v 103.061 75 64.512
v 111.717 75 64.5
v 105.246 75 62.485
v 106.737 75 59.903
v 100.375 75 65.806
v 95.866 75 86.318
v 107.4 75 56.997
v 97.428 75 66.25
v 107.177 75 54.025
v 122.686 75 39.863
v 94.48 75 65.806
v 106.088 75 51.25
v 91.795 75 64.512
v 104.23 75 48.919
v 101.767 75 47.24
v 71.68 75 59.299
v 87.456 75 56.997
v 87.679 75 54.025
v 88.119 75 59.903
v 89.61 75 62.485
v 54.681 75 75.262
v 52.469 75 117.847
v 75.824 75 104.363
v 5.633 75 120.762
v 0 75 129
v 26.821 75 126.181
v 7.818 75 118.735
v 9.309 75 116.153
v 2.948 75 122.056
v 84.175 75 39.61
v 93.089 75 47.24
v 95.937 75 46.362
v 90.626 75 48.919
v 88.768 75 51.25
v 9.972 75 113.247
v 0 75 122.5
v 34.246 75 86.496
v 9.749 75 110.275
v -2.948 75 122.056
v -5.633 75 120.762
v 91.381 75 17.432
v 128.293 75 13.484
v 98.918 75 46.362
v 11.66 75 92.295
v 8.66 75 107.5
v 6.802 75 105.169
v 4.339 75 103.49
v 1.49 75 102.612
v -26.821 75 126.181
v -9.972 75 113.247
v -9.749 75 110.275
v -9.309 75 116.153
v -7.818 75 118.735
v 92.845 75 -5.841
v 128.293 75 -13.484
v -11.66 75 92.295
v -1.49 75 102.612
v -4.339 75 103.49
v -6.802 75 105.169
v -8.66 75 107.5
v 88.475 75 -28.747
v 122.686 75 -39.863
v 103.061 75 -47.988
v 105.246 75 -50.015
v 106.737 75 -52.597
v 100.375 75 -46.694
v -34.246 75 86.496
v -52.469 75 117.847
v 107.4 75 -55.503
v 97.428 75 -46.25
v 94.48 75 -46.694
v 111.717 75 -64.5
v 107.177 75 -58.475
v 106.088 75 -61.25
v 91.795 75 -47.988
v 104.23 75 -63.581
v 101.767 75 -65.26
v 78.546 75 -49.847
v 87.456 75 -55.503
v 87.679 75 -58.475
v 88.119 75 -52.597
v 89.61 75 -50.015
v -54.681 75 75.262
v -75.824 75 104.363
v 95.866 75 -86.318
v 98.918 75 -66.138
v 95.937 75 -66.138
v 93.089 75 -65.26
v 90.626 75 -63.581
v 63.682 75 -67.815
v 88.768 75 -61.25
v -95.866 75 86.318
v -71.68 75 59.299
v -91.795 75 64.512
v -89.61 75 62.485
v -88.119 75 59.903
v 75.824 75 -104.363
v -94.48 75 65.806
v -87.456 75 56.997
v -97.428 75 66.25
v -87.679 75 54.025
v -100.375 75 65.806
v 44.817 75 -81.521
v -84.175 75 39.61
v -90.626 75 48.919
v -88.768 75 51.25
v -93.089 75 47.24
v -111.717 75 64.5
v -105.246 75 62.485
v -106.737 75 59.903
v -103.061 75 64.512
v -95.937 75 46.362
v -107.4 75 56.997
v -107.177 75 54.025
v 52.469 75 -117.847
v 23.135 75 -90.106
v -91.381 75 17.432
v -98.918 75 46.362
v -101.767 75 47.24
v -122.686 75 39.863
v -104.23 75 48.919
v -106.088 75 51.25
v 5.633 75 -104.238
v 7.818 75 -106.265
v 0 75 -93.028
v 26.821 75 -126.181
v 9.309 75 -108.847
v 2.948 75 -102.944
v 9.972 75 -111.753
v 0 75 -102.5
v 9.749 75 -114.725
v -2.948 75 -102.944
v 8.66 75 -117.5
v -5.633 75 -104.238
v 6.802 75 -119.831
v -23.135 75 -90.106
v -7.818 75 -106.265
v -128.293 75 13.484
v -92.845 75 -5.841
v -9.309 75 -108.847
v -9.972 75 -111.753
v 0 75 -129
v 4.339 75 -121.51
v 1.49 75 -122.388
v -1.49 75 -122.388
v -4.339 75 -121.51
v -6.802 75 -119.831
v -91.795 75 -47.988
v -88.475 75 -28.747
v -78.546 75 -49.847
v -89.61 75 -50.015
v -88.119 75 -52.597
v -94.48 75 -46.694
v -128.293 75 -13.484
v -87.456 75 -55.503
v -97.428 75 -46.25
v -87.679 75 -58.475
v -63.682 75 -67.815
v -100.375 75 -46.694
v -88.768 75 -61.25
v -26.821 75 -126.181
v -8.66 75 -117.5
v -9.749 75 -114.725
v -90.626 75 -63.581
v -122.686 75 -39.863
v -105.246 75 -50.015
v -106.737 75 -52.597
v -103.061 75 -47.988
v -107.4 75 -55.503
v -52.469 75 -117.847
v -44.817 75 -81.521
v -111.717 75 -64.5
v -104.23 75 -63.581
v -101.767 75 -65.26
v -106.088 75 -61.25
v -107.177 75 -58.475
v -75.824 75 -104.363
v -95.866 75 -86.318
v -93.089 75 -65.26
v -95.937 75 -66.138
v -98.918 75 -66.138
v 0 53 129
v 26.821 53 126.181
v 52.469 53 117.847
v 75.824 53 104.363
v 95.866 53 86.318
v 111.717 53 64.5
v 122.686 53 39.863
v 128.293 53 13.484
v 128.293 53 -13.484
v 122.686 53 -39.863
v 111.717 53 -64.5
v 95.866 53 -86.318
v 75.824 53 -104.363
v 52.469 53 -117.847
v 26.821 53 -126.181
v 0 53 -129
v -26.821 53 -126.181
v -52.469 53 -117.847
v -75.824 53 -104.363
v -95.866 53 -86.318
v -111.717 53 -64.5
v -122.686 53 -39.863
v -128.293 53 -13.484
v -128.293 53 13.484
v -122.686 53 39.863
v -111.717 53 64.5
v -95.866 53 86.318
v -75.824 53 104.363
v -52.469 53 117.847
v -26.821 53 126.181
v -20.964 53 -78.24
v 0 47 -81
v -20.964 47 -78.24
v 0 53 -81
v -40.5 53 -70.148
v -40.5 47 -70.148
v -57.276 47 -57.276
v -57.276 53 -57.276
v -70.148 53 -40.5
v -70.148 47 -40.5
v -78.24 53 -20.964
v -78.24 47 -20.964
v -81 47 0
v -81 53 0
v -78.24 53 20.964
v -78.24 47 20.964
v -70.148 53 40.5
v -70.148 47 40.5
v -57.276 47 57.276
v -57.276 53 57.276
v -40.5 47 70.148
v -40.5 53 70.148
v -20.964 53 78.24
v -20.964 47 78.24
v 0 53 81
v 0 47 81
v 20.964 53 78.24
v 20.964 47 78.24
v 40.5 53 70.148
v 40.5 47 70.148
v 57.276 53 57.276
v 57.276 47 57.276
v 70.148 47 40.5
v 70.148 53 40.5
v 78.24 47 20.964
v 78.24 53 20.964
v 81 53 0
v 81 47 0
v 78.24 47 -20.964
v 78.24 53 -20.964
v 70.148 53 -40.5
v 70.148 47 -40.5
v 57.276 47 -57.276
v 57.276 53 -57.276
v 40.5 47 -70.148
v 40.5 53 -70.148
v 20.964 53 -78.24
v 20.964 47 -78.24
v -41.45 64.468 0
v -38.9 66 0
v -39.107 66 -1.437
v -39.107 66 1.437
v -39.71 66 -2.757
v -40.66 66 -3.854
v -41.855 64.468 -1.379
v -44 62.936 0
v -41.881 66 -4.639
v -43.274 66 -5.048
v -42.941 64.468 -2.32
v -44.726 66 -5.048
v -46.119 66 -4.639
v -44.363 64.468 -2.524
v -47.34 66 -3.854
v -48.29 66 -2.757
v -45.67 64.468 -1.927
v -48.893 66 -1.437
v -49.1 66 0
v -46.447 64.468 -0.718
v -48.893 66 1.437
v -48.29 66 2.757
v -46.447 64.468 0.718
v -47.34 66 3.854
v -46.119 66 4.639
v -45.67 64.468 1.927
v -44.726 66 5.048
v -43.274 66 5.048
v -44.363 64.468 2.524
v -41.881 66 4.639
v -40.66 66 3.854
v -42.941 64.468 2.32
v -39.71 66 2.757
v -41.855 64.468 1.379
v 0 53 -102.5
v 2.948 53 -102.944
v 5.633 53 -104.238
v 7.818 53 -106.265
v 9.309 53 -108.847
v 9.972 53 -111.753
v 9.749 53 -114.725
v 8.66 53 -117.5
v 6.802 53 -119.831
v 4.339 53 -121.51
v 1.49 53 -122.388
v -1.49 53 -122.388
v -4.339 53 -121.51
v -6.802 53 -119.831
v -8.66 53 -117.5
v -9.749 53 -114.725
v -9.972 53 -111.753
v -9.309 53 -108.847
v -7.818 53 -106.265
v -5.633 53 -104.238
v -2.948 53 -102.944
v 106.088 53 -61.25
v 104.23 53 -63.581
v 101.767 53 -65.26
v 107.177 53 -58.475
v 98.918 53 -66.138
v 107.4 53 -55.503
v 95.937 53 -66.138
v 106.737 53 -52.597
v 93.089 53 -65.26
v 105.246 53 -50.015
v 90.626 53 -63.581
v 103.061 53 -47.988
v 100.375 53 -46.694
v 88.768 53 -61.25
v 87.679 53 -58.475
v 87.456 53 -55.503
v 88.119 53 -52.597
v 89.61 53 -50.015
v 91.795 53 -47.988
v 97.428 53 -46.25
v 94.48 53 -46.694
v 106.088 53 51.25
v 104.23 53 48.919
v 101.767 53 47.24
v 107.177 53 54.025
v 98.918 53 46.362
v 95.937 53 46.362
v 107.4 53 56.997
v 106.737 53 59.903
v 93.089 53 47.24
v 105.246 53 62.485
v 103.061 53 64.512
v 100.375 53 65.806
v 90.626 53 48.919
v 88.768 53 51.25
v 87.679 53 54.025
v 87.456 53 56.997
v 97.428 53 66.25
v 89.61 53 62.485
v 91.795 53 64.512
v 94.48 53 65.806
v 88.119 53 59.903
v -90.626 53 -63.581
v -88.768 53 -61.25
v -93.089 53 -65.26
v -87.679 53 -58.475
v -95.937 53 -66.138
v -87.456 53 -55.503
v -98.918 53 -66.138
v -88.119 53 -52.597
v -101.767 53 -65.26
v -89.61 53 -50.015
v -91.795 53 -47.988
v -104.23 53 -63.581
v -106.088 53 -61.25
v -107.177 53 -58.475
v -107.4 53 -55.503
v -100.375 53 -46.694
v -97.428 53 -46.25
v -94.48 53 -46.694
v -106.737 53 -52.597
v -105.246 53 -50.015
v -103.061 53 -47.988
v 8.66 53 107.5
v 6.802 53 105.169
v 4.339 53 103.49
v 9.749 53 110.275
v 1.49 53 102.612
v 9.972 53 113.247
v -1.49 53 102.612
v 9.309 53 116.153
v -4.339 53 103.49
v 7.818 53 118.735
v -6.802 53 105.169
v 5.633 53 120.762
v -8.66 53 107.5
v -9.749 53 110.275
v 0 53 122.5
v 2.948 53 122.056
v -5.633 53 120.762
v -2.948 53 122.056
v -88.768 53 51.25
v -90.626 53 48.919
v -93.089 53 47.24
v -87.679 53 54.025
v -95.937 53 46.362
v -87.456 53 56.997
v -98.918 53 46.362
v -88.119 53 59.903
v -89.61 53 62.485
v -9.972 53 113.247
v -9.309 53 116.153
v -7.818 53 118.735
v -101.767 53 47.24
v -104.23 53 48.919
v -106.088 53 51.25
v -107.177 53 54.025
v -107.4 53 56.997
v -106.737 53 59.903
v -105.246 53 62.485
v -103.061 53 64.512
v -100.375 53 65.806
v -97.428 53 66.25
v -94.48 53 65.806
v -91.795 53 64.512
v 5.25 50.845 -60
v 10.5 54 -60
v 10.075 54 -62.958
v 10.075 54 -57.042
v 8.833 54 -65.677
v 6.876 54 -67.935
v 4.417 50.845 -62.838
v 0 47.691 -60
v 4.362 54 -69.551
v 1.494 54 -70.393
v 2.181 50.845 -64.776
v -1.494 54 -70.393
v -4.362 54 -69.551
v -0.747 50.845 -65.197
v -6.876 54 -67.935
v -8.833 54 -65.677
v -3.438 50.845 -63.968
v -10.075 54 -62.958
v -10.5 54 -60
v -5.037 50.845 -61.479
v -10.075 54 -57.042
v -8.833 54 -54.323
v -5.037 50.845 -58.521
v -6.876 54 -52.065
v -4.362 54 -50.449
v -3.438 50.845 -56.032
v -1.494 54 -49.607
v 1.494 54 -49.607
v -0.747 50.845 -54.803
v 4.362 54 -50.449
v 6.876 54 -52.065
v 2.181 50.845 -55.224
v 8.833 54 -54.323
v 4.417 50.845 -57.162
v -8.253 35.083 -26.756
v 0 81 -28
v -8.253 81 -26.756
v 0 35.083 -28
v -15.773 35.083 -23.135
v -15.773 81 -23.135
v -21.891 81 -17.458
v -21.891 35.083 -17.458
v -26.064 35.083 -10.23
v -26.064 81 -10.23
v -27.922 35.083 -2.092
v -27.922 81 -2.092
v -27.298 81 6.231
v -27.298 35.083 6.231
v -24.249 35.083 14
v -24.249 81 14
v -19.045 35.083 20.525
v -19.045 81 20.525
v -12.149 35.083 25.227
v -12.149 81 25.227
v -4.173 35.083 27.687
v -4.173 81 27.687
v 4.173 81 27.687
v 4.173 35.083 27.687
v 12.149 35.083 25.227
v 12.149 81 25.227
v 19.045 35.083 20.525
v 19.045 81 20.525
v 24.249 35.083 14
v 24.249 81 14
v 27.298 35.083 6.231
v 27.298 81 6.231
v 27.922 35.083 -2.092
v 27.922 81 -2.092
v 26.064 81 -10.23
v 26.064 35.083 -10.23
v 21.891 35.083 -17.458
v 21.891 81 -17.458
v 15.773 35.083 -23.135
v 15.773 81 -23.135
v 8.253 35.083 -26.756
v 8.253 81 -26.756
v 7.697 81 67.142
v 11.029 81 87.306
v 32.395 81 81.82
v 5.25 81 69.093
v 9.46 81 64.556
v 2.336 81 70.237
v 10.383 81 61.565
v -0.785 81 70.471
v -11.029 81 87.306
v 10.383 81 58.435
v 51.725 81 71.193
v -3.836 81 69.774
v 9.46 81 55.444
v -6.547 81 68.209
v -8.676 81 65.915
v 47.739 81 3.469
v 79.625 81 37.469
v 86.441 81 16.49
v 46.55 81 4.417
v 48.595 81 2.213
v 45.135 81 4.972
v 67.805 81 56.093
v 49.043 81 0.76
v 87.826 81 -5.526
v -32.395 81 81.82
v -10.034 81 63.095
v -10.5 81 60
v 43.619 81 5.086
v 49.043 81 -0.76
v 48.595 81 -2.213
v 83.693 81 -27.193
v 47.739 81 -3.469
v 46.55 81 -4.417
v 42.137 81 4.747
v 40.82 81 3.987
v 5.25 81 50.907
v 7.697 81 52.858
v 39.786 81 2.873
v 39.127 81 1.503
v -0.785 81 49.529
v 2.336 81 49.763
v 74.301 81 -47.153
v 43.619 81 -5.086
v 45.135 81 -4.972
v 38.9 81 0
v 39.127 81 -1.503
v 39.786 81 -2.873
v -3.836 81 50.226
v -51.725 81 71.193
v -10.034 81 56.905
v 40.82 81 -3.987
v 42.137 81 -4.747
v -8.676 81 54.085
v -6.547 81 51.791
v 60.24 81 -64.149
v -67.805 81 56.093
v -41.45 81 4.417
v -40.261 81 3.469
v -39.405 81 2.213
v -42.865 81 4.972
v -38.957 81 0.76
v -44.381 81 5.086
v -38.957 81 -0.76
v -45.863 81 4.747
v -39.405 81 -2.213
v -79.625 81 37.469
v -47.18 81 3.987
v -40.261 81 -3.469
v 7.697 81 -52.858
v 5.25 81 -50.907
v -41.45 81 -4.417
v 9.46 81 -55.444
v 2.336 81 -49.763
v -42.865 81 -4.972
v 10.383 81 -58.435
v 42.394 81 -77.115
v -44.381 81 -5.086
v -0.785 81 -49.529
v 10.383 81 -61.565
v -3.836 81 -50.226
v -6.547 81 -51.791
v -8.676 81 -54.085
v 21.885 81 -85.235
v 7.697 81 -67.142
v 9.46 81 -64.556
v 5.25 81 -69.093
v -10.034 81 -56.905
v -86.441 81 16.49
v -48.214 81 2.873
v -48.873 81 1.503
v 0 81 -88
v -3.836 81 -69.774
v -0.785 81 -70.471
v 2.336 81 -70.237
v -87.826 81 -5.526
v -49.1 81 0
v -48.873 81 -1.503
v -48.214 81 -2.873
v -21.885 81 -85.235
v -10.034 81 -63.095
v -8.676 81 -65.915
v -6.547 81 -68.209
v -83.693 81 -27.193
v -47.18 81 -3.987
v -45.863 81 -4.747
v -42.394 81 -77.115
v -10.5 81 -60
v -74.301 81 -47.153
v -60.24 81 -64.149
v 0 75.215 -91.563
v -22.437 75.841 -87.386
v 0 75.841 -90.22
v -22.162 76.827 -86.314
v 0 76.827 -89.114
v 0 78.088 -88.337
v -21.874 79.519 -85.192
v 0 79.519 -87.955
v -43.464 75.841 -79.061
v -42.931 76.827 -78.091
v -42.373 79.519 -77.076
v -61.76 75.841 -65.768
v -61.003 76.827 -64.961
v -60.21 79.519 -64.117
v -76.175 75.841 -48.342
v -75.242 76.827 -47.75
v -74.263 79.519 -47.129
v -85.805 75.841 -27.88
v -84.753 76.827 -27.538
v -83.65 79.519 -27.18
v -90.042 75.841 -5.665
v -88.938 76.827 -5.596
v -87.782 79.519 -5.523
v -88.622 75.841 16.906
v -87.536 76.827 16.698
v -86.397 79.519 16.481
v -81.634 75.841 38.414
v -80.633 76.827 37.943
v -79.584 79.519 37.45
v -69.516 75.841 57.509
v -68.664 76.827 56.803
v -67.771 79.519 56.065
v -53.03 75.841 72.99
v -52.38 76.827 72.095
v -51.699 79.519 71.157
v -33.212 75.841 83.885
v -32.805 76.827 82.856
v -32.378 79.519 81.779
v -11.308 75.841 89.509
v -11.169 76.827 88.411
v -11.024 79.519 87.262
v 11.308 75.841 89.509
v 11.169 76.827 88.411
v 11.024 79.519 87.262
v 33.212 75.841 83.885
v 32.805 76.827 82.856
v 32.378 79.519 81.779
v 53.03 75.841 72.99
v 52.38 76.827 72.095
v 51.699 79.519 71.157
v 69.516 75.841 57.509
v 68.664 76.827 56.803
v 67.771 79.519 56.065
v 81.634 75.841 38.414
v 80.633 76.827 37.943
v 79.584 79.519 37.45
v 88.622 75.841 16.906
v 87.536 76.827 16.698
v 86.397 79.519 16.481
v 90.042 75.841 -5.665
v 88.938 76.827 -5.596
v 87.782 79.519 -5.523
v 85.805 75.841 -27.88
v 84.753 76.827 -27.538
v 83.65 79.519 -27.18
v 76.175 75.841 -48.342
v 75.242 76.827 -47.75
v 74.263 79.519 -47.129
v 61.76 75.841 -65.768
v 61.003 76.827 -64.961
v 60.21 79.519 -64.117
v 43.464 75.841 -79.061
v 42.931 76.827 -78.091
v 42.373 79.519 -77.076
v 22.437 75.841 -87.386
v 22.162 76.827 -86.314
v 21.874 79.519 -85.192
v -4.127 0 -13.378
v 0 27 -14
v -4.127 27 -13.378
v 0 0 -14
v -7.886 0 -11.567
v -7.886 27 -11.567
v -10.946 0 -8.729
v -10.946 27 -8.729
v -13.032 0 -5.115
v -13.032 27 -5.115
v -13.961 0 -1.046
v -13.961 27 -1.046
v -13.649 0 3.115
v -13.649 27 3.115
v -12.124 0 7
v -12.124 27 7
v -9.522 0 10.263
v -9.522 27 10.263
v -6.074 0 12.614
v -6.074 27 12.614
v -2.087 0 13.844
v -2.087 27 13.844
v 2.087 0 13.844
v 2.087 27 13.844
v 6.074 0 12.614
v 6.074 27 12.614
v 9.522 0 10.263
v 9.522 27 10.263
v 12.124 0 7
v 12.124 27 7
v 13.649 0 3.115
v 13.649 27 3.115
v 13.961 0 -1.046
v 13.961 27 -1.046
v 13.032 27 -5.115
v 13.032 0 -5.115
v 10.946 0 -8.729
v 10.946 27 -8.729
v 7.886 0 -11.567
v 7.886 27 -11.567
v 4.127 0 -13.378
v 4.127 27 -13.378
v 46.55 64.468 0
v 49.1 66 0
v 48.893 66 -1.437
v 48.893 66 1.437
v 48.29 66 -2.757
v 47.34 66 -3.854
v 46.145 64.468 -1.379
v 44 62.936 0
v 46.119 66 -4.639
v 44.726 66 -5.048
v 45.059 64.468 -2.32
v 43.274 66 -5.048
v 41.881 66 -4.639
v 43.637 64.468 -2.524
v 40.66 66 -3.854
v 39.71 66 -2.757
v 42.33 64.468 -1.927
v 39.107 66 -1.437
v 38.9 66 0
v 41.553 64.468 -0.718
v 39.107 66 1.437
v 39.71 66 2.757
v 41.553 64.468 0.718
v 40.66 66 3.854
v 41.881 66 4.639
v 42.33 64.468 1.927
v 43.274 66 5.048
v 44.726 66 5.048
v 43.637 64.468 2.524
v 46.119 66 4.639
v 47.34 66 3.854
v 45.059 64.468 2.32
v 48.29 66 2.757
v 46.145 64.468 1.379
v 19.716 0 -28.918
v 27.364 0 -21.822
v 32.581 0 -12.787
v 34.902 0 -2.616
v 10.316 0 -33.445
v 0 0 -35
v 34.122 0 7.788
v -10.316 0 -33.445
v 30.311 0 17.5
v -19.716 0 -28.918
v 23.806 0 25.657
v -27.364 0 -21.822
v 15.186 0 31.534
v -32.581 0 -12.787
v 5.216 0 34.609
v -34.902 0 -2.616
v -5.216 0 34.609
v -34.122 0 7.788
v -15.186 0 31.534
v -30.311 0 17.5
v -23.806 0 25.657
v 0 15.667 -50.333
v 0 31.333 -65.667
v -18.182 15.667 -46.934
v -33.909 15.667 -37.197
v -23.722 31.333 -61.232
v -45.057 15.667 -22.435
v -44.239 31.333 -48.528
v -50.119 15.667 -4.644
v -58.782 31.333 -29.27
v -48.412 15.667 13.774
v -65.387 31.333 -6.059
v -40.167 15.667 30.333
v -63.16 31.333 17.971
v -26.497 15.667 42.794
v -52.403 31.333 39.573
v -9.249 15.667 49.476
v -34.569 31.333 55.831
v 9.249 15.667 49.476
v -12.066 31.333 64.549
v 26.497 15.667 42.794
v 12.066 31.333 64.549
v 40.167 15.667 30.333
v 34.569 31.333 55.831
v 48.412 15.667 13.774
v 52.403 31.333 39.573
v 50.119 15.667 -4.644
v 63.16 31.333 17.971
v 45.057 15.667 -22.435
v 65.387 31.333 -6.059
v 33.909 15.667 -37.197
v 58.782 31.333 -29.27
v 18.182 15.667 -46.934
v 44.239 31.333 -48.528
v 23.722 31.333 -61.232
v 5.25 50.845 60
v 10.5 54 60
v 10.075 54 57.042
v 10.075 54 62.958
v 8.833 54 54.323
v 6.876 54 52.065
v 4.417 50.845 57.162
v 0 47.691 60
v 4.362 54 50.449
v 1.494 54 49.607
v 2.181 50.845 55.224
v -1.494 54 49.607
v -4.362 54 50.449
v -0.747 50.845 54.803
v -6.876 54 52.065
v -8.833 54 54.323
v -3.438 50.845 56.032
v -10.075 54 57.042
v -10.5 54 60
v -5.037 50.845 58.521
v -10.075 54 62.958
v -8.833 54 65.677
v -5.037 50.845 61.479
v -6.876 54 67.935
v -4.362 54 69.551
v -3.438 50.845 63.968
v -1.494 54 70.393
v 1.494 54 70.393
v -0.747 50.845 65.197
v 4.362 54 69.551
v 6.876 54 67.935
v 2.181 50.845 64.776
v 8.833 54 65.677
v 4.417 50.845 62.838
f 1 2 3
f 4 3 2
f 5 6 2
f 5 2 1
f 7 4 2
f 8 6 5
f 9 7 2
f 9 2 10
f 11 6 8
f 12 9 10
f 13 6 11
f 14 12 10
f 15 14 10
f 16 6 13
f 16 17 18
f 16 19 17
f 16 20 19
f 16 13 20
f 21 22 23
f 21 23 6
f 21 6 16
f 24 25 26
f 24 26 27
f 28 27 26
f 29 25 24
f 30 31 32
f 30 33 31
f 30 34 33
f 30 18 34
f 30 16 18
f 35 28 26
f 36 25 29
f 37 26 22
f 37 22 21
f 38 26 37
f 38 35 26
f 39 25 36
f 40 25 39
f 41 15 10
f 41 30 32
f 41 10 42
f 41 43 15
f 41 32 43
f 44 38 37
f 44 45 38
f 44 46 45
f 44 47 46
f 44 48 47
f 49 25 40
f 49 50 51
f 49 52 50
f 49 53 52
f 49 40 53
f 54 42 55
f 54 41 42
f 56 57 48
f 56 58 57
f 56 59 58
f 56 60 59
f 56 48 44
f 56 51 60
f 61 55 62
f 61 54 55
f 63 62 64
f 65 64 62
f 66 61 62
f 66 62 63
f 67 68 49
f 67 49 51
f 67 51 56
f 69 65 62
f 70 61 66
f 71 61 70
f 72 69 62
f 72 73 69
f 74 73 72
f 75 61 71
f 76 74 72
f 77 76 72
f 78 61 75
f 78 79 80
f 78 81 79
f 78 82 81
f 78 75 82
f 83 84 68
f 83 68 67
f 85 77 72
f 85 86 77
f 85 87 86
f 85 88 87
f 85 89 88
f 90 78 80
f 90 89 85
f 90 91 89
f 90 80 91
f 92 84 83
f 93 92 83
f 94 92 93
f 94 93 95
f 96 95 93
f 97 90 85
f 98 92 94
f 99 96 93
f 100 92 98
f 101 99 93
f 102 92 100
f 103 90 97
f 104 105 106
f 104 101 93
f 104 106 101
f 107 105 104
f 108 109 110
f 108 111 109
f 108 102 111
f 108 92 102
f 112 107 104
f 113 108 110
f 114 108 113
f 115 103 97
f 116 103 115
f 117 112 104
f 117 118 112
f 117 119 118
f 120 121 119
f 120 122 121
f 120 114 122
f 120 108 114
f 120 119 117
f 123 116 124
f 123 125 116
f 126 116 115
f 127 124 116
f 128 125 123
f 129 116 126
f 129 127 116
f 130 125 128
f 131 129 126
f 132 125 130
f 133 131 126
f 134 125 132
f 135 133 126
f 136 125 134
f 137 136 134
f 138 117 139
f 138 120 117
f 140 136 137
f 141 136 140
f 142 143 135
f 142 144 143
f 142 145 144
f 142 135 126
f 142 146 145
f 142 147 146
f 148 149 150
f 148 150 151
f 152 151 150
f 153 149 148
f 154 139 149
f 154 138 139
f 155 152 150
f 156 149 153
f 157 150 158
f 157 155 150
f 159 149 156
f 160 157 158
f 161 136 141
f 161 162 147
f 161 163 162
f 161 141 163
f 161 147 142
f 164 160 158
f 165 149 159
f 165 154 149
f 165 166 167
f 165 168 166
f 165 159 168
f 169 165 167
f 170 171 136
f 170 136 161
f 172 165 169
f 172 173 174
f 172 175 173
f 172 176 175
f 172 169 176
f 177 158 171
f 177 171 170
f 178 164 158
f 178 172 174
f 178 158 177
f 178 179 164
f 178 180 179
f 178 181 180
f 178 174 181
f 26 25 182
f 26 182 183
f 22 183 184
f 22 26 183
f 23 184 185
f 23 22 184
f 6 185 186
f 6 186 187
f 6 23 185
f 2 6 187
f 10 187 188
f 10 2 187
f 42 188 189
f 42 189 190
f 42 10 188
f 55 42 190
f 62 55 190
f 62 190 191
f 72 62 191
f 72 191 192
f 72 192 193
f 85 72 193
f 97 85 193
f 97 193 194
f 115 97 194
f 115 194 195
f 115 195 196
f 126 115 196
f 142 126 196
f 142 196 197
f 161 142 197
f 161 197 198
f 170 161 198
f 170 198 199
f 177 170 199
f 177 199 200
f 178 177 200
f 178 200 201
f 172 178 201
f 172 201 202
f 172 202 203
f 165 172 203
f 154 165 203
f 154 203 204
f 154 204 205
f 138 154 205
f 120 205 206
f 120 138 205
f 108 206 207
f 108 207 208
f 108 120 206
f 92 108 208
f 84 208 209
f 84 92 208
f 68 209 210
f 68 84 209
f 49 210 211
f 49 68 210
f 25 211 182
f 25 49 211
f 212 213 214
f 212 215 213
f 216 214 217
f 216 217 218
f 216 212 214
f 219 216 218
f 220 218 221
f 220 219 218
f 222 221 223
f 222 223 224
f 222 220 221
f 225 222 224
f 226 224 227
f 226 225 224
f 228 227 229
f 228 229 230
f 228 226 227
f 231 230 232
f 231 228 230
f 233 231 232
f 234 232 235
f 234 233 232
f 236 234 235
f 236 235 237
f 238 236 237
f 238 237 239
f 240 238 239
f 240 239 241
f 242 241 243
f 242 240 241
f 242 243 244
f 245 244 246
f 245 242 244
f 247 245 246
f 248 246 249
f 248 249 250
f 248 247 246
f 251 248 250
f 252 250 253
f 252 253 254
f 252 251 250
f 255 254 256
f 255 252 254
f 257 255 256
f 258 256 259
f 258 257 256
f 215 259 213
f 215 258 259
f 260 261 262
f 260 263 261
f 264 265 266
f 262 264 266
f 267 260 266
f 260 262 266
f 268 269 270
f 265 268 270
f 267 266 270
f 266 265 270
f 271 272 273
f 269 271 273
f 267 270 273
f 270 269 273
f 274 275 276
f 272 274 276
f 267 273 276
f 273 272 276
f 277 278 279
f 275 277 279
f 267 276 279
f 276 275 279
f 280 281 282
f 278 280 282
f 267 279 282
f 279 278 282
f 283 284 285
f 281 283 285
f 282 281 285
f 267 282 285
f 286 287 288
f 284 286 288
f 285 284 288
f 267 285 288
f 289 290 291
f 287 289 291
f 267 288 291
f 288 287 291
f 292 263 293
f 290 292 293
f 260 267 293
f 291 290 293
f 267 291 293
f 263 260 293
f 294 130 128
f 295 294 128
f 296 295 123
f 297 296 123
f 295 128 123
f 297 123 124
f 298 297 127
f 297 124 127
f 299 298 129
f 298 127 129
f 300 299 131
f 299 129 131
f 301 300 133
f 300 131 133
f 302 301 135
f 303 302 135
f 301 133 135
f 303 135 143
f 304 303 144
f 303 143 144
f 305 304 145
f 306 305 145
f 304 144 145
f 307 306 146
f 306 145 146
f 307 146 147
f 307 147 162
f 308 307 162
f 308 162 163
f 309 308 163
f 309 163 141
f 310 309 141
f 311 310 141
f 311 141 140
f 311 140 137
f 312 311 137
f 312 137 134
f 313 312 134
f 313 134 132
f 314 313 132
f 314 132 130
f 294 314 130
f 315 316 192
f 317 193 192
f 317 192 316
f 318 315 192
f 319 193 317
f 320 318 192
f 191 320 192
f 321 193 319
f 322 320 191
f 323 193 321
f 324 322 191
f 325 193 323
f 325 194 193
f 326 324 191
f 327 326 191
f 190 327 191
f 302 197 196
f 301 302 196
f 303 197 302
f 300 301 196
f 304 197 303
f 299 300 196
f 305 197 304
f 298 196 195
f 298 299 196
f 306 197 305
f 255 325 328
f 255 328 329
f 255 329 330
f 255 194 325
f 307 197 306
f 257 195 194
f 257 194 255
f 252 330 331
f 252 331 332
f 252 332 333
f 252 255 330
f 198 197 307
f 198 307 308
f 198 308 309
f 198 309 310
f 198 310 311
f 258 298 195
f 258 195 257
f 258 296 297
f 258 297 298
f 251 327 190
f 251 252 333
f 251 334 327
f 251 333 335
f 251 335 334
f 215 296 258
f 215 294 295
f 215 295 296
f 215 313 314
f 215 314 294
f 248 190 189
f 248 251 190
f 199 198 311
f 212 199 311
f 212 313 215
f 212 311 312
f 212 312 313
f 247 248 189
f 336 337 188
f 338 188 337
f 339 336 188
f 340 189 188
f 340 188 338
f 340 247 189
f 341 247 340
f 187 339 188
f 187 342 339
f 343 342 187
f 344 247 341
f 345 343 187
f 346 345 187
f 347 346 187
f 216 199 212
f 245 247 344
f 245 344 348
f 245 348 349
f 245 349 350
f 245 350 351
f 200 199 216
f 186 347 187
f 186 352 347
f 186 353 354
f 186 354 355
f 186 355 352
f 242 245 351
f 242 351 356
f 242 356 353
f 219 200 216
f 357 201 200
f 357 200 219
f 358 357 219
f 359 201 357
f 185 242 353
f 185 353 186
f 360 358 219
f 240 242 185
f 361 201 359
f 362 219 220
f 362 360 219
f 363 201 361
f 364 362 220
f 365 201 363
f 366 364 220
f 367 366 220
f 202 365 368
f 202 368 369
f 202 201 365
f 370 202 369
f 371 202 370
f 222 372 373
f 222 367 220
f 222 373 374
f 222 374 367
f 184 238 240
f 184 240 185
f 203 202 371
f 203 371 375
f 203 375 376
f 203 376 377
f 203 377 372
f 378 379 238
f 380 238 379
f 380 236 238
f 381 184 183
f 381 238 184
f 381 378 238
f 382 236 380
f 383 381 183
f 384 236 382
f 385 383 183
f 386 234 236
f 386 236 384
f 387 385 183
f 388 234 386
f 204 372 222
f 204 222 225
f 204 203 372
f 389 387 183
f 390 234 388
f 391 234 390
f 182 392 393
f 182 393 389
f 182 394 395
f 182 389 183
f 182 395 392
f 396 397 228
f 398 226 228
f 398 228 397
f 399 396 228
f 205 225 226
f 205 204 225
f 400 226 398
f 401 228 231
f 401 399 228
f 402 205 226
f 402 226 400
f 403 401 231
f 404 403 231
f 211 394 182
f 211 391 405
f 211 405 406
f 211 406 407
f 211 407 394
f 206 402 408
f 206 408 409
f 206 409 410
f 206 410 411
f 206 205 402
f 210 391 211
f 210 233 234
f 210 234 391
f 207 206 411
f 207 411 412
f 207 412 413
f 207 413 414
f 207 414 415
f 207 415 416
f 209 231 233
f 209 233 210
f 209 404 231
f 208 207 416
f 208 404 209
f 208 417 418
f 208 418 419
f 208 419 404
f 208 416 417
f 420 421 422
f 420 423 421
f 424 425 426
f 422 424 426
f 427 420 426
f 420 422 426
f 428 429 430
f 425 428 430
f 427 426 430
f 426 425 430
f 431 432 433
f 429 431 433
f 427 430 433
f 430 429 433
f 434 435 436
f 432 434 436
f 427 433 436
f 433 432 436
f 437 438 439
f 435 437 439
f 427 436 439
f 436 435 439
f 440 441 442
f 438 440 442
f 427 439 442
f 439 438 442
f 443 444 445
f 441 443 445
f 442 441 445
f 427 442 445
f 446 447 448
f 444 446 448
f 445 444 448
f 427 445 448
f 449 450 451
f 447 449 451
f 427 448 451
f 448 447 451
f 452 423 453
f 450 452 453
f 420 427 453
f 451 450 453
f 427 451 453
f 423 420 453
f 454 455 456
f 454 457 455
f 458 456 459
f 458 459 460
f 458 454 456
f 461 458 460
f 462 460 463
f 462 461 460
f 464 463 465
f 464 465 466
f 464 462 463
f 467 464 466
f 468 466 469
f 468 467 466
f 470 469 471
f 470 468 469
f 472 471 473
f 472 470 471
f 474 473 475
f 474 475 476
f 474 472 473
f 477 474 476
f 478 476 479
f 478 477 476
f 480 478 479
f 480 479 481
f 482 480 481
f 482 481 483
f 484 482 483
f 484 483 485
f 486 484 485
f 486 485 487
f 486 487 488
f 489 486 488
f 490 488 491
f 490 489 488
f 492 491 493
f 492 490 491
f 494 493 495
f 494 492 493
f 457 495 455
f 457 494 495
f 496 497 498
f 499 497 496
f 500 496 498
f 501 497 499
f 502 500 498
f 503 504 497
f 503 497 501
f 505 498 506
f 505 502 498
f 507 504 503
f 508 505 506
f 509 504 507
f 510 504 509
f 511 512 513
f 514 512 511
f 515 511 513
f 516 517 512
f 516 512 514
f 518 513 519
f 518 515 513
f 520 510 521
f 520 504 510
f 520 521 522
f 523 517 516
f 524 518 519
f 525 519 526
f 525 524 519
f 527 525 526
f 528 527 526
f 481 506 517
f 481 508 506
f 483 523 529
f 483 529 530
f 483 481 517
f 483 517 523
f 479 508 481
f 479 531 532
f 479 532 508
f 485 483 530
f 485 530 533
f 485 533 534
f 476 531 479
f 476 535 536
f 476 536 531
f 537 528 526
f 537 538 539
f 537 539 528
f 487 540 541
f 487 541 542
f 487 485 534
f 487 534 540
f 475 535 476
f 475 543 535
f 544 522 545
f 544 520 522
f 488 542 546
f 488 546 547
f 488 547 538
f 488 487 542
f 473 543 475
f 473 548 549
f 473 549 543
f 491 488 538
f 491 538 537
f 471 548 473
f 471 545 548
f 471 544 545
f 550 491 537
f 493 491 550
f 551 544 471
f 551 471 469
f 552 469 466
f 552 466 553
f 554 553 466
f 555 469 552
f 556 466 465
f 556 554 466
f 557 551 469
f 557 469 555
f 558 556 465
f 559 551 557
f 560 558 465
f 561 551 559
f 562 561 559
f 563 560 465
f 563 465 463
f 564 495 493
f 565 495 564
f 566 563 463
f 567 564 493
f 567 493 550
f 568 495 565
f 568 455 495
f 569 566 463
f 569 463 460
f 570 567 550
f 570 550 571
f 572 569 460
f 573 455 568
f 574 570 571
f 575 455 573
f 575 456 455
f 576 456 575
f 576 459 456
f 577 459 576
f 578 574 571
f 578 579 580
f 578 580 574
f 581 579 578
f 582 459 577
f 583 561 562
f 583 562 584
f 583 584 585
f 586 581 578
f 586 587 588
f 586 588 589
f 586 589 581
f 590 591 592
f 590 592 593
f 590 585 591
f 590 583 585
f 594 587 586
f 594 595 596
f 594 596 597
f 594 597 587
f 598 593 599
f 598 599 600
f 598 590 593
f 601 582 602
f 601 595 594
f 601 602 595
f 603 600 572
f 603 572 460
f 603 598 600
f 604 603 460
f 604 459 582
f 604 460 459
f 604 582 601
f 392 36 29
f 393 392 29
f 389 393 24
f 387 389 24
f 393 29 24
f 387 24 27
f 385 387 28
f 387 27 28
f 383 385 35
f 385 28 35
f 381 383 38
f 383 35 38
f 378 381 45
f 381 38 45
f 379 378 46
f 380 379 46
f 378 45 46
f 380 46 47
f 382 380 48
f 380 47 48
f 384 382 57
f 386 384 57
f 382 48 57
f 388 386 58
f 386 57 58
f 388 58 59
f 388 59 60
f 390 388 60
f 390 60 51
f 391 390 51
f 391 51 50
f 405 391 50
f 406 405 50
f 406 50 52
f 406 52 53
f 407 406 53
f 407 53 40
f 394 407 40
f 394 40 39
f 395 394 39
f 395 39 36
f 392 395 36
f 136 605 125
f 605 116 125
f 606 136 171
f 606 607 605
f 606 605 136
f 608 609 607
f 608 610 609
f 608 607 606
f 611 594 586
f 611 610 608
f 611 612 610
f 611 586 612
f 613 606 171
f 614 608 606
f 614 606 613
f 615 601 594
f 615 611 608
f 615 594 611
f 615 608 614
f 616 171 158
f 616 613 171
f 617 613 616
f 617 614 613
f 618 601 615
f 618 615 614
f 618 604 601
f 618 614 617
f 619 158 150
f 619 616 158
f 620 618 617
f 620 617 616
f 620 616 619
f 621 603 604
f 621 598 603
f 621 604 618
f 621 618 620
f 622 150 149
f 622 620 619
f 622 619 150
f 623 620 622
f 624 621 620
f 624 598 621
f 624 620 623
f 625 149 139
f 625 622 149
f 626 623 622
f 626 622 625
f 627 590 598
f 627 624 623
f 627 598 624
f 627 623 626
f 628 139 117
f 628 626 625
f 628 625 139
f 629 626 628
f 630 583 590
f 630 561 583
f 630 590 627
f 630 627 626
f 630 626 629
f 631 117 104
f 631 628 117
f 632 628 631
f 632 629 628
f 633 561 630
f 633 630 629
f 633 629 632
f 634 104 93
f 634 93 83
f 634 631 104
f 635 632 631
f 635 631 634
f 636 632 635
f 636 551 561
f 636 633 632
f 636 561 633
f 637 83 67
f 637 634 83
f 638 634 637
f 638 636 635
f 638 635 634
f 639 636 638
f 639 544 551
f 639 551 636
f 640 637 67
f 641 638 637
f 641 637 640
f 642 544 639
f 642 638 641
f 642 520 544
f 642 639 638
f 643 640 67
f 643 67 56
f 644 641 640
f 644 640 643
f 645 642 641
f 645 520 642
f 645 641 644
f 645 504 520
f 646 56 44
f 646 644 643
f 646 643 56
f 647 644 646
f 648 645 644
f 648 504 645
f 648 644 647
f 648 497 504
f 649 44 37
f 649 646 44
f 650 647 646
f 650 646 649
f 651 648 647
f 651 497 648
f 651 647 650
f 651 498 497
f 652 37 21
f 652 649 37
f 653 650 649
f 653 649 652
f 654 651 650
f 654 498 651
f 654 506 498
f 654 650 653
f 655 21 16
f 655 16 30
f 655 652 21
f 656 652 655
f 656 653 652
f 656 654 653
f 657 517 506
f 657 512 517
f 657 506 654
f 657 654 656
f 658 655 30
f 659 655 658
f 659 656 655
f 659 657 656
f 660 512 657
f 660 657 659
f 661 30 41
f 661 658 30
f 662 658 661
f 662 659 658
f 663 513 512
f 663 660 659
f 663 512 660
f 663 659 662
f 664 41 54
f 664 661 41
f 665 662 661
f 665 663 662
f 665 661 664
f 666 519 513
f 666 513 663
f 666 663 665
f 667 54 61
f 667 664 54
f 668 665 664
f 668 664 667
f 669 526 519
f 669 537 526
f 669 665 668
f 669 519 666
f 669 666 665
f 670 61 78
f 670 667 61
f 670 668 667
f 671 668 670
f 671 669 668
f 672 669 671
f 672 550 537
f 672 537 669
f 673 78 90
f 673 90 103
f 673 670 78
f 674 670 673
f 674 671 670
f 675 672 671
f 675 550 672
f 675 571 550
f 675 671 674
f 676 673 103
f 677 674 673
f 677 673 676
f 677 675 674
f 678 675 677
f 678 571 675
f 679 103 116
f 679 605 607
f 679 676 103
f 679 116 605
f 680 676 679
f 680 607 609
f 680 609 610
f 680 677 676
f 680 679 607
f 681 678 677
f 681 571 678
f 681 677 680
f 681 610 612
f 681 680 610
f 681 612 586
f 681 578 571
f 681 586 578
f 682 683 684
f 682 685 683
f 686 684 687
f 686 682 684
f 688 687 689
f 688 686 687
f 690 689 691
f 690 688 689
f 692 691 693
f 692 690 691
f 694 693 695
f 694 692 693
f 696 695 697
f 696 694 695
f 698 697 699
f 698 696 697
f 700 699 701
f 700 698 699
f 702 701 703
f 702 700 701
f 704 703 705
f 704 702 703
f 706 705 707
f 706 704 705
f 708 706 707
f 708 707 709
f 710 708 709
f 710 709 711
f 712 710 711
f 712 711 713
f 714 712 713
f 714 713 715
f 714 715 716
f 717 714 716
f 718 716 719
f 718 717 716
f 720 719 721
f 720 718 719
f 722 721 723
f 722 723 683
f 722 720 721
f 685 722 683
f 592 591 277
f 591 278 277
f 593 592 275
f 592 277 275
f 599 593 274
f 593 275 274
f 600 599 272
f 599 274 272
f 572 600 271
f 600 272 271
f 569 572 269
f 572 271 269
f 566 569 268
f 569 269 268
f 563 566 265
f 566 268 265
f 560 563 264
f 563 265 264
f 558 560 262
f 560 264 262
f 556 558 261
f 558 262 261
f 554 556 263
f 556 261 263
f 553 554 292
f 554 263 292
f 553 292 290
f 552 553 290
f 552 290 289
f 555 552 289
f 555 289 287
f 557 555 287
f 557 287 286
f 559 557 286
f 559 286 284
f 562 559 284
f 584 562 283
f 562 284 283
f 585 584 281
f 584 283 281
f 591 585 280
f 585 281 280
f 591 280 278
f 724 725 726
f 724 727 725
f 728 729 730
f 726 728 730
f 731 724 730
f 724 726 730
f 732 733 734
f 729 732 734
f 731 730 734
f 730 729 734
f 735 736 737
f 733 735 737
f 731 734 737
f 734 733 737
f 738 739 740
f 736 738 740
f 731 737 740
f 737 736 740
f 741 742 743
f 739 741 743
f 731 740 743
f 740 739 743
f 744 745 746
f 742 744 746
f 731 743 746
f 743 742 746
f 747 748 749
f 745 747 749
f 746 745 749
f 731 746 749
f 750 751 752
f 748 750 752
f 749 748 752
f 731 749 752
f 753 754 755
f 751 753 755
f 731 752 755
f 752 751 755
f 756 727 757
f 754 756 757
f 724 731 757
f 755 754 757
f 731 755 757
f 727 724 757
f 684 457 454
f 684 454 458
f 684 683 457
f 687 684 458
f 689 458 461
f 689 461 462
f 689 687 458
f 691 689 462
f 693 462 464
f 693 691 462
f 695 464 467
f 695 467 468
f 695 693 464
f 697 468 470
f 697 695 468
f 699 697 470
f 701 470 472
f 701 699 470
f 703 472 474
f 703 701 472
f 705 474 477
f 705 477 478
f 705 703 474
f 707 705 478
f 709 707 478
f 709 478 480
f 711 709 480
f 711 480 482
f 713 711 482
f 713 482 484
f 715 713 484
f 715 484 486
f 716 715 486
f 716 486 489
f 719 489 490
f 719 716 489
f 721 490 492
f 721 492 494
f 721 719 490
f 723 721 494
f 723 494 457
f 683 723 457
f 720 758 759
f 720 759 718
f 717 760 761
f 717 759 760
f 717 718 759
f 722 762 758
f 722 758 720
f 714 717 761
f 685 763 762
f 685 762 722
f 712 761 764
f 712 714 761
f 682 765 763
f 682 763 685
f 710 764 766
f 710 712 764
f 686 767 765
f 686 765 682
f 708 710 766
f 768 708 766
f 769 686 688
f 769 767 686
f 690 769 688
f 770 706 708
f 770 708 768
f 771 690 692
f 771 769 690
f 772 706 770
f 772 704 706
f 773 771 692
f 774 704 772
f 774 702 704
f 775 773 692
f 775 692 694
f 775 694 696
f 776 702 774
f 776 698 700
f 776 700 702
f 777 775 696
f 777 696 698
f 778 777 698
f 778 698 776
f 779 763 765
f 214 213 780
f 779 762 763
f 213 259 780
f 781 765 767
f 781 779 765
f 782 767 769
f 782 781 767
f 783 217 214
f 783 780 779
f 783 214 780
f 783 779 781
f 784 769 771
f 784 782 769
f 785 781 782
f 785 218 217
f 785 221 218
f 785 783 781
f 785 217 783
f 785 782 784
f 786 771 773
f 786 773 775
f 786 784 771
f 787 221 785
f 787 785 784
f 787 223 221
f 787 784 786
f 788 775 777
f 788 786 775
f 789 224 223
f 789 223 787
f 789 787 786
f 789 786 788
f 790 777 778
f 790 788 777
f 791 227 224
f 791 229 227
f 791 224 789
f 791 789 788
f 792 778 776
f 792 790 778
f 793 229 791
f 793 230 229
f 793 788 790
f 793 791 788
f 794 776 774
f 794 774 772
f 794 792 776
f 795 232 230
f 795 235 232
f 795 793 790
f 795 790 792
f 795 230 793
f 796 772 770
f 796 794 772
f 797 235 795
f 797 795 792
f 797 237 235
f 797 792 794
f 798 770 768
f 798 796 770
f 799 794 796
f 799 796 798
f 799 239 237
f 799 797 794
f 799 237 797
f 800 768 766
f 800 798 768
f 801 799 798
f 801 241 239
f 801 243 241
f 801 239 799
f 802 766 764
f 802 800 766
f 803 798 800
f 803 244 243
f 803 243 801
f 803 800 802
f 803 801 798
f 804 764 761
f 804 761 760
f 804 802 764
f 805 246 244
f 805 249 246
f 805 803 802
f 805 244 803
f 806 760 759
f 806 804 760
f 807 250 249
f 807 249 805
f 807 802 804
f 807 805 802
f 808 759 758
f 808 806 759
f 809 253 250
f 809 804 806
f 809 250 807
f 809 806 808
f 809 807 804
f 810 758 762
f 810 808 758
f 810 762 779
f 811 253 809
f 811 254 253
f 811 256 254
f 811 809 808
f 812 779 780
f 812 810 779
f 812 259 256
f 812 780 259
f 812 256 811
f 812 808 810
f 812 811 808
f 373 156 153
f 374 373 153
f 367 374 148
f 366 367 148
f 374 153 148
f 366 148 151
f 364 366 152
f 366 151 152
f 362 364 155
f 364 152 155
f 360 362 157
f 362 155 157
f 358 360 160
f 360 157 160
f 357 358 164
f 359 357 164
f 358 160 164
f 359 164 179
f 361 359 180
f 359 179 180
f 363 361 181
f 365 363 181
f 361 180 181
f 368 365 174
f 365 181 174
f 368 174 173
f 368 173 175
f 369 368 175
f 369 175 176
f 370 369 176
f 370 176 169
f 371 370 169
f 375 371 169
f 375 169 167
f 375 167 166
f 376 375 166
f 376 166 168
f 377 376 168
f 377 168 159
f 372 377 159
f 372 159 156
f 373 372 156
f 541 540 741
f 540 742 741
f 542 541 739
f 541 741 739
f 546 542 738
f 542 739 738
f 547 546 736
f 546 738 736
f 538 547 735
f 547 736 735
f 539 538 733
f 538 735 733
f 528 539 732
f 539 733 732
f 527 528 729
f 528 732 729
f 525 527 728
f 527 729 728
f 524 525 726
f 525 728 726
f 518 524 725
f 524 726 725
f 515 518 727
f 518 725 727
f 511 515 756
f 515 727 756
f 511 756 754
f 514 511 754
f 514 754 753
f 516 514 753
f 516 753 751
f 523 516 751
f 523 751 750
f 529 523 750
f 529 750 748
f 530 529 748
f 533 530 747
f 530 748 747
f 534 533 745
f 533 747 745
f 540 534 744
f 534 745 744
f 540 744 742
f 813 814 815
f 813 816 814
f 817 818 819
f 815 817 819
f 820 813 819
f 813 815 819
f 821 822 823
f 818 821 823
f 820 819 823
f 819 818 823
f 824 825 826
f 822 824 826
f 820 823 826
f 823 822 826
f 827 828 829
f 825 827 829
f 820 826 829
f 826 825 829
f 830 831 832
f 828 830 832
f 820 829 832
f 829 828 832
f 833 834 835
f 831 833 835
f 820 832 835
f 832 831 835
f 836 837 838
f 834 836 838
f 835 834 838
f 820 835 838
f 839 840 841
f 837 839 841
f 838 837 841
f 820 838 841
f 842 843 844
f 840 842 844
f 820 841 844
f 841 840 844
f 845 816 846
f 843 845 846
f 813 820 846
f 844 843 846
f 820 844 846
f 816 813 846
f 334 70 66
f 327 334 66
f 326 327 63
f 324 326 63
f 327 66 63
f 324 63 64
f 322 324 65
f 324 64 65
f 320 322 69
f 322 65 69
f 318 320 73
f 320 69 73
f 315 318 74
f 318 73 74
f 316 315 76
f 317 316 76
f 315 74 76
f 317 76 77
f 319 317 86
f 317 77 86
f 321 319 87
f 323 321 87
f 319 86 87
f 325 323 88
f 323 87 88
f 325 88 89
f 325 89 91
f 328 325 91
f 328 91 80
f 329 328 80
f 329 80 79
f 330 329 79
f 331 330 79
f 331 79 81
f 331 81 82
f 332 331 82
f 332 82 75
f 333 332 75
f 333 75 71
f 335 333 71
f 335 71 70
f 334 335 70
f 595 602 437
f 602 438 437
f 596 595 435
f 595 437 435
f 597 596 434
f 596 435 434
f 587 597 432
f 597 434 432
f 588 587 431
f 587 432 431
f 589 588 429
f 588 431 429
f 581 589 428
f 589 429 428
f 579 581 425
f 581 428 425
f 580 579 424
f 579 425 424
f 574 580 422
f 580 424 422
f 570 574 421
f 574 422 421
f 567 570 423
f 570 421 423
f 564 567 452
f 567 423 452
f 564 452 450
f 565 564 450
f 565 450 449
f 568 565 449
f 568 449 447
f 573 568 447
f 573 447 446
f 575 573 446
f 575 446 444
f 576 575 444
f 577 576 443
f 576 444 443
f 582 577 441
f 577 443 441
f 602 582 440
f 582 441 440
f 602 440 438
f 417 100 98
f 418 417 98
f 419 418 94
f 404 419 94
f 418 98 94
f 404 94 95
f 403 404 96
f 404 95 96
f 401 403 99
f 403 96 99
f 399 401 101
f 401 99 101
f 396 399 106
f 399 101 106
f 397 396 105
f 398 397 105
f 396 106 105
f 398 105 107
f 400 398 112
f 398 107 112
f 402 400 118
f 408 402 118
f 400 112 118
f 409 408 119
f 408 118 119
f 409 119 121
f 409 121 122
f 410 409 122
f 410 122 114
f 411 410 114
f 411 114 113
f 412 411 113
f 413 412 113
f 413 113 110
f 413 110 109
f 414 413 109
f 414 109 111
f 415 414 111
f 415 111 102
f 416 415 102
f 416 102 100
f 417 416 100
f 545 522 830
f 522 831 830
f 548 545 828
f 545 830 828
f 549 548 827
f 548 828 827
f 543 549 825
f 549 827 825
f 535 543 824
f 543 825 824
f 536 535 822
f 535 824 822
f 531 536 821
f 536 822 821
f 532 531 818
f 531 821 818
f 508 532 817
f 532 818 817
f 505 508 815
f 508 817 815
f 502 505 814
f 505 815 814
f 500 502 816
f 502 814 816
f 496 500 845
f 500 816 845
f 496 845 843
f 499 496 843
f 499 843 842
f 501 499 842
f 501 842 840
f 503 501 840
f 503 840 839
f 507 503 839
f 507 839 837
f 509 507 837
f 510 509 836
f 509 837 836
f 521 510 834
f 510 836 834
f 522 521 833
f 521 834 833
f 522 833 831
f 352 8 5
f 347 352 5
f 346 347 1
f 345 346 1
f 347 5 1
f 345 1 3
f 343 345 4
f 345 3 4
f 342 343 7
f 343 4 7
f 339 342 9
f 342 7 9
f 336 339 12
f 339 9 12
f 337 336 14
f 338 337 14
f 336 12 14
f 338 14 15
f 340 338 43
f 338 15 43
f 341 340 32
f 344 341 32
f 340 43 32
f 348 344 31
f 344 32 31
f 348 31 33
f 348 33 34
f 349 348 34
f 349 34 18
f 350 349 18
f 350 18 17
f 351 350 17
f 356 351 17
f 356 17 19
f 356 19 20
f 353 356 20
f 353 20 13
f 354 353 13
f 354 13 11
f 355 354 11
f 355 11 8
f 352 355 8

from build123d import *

# Parameters (mm, degrees)
SKETCH2_R              = 10
CUT_EXTRUDE1_DEPTH     = 210.076541008
M24_TAPPED_HOLE1_D     = 21
M24_TAPPED_HOLE1_DEPTH = 27
M24_TAPPED_HOLE1_TIP   = 6.3090365
M12_TAPPED_HOLE1_D     = 10.2
M12_TAPPED_HOLE1_DEPTH = 15
M12_TAPPED_HOLE1_TIP   = 3.064389157
SKETCH7_R              = 138
SKETCH7_R_2            = 129
CUT_EXTRUDE2_DEPTH     = 61


with BuildPart() as part:
    # Sketch1 → Revolve1 (revolve)
    with BuildSketch(Plane(origin=(0, 0, 0), x_dir=(0, 0, -1), z_dir=(1, 0, 0))):
        with BuildLine():
            Line((14, 0), (35, 0))
            Line((35, 0), (81, 47))
            Line((81, 47), (81, 53))
            Line((81, 53), (138, 53))
            Line((138, 53), (138, 75))
            Line((138, 75), (93.028360941, 75))
            ThreePointArc((93.028360941, 75), (89.114142828, 76.826684234), (88, 81))
            Line((88, 81), (28, 81))
            Line((28, 81), (28, 35.082903769))
            Line((28, 35.082903769), (14, 27))
            Line((14, 27), (14, 0))
        make_face()
    revolve(axis=Axis((0, 0, 0), (0, 1, 0)))

    # Sketch2 → Cut-Extrude1 (cut, through all)
    with BuildSketch(Plane(origin=(0, 75, 0), x_dir=(1, 0, 0), z_dir=(0, 1, 0))):
        with Locations(Location((0, 112.5, 0), (0, 0, 270))):
            Circle(SKETCH2_R)
        with Locations(Location((97.427857926, 56.25, 0), (0, 0, 270))):
            Circle(SKETCH2_R)
        with Locations(Location((97.427857926, -56.25, 0), (0, 0, 270))):
            Circle(SKETCH2_R)
        with Locations(Location((0, -112.5, 0), (0, 0, 270))):
            Circle(SKETCH2_R)
        with Locations(Location((-97.427857926, -56.25, 0), (0, 0, 270))):
            Circle(SKETCH2_R)
        with Locations(Location((-97.427857926, 56.25, 0), (0, 0, 270))):
            Circle(SKETCH2_R)
    extrude(amount=-CUT_EXTRUDE1_DEPTH, mode=Mode.SUBTRACT)

    # M24 Tapped Hole1
    with Locations(Plane(origin=(0, 81, 0), x_dir=(1, 0, 0), z_dir=(0, 1, 0))):
        with Locations((0, 60), (0, -60)):
            Hole(M24_TAPPED_HOLE1_D / 2, depth=M24_TAPPED_HOLE1_DEPTH)
            with Locations((0, 0, -(M24_TAPPED_HOLE1_DEPTH + M24_TAPPED_HOLE1_TIP / 2))):  # 118° drill point
                Cone(0, M24_TAPPED_HOLE1_D / 2, M24_TAPPED_HOLE1_TIP, mode=Mode.SUBTRACT)

    # M12 Tapped Hole1
    with Locations(Plane(origin=(0, 81, 0), x_dir=(1, 0, 0), z_dir=(0, 1, 0))):
        with Locations((-44, 0), (44, 0)):
            Hole(M12_TAPPED_HOLE1_D / 2, depth=M12_TAPPED_HOLE1_DEPTH)
            with Locations((0, 0, -(M12_TAPPED_HOLE1_DEPTH + M12_TAPPED_HOLE1_TIP / 2))):  # 118° drill point
                Cone(0, M12_TAPPED_HOLE1_D / 2, M12_TAPPED_HOLE1_TIP, mode=Mode.SUBTRACT)

    # Sketch7 → Cut-Extrude2 (cut)
    with BuildSketch(Plane(origin=(0, 81, 0), x_dir=(1, 0, 0), z_dir=(0, 1, 0))):
        Circle(SKETCH7_R)
        with Locations(Location((0, 0, 0), (0, 0, 270))):
            Circle(SKETCH7_R_2, mode=Mode.SUBTRACT)
    extrude(amount=-CUT_EXTRUDE2_DEPTH, mode=Mode.SUBTRACT)


solid = part.part
